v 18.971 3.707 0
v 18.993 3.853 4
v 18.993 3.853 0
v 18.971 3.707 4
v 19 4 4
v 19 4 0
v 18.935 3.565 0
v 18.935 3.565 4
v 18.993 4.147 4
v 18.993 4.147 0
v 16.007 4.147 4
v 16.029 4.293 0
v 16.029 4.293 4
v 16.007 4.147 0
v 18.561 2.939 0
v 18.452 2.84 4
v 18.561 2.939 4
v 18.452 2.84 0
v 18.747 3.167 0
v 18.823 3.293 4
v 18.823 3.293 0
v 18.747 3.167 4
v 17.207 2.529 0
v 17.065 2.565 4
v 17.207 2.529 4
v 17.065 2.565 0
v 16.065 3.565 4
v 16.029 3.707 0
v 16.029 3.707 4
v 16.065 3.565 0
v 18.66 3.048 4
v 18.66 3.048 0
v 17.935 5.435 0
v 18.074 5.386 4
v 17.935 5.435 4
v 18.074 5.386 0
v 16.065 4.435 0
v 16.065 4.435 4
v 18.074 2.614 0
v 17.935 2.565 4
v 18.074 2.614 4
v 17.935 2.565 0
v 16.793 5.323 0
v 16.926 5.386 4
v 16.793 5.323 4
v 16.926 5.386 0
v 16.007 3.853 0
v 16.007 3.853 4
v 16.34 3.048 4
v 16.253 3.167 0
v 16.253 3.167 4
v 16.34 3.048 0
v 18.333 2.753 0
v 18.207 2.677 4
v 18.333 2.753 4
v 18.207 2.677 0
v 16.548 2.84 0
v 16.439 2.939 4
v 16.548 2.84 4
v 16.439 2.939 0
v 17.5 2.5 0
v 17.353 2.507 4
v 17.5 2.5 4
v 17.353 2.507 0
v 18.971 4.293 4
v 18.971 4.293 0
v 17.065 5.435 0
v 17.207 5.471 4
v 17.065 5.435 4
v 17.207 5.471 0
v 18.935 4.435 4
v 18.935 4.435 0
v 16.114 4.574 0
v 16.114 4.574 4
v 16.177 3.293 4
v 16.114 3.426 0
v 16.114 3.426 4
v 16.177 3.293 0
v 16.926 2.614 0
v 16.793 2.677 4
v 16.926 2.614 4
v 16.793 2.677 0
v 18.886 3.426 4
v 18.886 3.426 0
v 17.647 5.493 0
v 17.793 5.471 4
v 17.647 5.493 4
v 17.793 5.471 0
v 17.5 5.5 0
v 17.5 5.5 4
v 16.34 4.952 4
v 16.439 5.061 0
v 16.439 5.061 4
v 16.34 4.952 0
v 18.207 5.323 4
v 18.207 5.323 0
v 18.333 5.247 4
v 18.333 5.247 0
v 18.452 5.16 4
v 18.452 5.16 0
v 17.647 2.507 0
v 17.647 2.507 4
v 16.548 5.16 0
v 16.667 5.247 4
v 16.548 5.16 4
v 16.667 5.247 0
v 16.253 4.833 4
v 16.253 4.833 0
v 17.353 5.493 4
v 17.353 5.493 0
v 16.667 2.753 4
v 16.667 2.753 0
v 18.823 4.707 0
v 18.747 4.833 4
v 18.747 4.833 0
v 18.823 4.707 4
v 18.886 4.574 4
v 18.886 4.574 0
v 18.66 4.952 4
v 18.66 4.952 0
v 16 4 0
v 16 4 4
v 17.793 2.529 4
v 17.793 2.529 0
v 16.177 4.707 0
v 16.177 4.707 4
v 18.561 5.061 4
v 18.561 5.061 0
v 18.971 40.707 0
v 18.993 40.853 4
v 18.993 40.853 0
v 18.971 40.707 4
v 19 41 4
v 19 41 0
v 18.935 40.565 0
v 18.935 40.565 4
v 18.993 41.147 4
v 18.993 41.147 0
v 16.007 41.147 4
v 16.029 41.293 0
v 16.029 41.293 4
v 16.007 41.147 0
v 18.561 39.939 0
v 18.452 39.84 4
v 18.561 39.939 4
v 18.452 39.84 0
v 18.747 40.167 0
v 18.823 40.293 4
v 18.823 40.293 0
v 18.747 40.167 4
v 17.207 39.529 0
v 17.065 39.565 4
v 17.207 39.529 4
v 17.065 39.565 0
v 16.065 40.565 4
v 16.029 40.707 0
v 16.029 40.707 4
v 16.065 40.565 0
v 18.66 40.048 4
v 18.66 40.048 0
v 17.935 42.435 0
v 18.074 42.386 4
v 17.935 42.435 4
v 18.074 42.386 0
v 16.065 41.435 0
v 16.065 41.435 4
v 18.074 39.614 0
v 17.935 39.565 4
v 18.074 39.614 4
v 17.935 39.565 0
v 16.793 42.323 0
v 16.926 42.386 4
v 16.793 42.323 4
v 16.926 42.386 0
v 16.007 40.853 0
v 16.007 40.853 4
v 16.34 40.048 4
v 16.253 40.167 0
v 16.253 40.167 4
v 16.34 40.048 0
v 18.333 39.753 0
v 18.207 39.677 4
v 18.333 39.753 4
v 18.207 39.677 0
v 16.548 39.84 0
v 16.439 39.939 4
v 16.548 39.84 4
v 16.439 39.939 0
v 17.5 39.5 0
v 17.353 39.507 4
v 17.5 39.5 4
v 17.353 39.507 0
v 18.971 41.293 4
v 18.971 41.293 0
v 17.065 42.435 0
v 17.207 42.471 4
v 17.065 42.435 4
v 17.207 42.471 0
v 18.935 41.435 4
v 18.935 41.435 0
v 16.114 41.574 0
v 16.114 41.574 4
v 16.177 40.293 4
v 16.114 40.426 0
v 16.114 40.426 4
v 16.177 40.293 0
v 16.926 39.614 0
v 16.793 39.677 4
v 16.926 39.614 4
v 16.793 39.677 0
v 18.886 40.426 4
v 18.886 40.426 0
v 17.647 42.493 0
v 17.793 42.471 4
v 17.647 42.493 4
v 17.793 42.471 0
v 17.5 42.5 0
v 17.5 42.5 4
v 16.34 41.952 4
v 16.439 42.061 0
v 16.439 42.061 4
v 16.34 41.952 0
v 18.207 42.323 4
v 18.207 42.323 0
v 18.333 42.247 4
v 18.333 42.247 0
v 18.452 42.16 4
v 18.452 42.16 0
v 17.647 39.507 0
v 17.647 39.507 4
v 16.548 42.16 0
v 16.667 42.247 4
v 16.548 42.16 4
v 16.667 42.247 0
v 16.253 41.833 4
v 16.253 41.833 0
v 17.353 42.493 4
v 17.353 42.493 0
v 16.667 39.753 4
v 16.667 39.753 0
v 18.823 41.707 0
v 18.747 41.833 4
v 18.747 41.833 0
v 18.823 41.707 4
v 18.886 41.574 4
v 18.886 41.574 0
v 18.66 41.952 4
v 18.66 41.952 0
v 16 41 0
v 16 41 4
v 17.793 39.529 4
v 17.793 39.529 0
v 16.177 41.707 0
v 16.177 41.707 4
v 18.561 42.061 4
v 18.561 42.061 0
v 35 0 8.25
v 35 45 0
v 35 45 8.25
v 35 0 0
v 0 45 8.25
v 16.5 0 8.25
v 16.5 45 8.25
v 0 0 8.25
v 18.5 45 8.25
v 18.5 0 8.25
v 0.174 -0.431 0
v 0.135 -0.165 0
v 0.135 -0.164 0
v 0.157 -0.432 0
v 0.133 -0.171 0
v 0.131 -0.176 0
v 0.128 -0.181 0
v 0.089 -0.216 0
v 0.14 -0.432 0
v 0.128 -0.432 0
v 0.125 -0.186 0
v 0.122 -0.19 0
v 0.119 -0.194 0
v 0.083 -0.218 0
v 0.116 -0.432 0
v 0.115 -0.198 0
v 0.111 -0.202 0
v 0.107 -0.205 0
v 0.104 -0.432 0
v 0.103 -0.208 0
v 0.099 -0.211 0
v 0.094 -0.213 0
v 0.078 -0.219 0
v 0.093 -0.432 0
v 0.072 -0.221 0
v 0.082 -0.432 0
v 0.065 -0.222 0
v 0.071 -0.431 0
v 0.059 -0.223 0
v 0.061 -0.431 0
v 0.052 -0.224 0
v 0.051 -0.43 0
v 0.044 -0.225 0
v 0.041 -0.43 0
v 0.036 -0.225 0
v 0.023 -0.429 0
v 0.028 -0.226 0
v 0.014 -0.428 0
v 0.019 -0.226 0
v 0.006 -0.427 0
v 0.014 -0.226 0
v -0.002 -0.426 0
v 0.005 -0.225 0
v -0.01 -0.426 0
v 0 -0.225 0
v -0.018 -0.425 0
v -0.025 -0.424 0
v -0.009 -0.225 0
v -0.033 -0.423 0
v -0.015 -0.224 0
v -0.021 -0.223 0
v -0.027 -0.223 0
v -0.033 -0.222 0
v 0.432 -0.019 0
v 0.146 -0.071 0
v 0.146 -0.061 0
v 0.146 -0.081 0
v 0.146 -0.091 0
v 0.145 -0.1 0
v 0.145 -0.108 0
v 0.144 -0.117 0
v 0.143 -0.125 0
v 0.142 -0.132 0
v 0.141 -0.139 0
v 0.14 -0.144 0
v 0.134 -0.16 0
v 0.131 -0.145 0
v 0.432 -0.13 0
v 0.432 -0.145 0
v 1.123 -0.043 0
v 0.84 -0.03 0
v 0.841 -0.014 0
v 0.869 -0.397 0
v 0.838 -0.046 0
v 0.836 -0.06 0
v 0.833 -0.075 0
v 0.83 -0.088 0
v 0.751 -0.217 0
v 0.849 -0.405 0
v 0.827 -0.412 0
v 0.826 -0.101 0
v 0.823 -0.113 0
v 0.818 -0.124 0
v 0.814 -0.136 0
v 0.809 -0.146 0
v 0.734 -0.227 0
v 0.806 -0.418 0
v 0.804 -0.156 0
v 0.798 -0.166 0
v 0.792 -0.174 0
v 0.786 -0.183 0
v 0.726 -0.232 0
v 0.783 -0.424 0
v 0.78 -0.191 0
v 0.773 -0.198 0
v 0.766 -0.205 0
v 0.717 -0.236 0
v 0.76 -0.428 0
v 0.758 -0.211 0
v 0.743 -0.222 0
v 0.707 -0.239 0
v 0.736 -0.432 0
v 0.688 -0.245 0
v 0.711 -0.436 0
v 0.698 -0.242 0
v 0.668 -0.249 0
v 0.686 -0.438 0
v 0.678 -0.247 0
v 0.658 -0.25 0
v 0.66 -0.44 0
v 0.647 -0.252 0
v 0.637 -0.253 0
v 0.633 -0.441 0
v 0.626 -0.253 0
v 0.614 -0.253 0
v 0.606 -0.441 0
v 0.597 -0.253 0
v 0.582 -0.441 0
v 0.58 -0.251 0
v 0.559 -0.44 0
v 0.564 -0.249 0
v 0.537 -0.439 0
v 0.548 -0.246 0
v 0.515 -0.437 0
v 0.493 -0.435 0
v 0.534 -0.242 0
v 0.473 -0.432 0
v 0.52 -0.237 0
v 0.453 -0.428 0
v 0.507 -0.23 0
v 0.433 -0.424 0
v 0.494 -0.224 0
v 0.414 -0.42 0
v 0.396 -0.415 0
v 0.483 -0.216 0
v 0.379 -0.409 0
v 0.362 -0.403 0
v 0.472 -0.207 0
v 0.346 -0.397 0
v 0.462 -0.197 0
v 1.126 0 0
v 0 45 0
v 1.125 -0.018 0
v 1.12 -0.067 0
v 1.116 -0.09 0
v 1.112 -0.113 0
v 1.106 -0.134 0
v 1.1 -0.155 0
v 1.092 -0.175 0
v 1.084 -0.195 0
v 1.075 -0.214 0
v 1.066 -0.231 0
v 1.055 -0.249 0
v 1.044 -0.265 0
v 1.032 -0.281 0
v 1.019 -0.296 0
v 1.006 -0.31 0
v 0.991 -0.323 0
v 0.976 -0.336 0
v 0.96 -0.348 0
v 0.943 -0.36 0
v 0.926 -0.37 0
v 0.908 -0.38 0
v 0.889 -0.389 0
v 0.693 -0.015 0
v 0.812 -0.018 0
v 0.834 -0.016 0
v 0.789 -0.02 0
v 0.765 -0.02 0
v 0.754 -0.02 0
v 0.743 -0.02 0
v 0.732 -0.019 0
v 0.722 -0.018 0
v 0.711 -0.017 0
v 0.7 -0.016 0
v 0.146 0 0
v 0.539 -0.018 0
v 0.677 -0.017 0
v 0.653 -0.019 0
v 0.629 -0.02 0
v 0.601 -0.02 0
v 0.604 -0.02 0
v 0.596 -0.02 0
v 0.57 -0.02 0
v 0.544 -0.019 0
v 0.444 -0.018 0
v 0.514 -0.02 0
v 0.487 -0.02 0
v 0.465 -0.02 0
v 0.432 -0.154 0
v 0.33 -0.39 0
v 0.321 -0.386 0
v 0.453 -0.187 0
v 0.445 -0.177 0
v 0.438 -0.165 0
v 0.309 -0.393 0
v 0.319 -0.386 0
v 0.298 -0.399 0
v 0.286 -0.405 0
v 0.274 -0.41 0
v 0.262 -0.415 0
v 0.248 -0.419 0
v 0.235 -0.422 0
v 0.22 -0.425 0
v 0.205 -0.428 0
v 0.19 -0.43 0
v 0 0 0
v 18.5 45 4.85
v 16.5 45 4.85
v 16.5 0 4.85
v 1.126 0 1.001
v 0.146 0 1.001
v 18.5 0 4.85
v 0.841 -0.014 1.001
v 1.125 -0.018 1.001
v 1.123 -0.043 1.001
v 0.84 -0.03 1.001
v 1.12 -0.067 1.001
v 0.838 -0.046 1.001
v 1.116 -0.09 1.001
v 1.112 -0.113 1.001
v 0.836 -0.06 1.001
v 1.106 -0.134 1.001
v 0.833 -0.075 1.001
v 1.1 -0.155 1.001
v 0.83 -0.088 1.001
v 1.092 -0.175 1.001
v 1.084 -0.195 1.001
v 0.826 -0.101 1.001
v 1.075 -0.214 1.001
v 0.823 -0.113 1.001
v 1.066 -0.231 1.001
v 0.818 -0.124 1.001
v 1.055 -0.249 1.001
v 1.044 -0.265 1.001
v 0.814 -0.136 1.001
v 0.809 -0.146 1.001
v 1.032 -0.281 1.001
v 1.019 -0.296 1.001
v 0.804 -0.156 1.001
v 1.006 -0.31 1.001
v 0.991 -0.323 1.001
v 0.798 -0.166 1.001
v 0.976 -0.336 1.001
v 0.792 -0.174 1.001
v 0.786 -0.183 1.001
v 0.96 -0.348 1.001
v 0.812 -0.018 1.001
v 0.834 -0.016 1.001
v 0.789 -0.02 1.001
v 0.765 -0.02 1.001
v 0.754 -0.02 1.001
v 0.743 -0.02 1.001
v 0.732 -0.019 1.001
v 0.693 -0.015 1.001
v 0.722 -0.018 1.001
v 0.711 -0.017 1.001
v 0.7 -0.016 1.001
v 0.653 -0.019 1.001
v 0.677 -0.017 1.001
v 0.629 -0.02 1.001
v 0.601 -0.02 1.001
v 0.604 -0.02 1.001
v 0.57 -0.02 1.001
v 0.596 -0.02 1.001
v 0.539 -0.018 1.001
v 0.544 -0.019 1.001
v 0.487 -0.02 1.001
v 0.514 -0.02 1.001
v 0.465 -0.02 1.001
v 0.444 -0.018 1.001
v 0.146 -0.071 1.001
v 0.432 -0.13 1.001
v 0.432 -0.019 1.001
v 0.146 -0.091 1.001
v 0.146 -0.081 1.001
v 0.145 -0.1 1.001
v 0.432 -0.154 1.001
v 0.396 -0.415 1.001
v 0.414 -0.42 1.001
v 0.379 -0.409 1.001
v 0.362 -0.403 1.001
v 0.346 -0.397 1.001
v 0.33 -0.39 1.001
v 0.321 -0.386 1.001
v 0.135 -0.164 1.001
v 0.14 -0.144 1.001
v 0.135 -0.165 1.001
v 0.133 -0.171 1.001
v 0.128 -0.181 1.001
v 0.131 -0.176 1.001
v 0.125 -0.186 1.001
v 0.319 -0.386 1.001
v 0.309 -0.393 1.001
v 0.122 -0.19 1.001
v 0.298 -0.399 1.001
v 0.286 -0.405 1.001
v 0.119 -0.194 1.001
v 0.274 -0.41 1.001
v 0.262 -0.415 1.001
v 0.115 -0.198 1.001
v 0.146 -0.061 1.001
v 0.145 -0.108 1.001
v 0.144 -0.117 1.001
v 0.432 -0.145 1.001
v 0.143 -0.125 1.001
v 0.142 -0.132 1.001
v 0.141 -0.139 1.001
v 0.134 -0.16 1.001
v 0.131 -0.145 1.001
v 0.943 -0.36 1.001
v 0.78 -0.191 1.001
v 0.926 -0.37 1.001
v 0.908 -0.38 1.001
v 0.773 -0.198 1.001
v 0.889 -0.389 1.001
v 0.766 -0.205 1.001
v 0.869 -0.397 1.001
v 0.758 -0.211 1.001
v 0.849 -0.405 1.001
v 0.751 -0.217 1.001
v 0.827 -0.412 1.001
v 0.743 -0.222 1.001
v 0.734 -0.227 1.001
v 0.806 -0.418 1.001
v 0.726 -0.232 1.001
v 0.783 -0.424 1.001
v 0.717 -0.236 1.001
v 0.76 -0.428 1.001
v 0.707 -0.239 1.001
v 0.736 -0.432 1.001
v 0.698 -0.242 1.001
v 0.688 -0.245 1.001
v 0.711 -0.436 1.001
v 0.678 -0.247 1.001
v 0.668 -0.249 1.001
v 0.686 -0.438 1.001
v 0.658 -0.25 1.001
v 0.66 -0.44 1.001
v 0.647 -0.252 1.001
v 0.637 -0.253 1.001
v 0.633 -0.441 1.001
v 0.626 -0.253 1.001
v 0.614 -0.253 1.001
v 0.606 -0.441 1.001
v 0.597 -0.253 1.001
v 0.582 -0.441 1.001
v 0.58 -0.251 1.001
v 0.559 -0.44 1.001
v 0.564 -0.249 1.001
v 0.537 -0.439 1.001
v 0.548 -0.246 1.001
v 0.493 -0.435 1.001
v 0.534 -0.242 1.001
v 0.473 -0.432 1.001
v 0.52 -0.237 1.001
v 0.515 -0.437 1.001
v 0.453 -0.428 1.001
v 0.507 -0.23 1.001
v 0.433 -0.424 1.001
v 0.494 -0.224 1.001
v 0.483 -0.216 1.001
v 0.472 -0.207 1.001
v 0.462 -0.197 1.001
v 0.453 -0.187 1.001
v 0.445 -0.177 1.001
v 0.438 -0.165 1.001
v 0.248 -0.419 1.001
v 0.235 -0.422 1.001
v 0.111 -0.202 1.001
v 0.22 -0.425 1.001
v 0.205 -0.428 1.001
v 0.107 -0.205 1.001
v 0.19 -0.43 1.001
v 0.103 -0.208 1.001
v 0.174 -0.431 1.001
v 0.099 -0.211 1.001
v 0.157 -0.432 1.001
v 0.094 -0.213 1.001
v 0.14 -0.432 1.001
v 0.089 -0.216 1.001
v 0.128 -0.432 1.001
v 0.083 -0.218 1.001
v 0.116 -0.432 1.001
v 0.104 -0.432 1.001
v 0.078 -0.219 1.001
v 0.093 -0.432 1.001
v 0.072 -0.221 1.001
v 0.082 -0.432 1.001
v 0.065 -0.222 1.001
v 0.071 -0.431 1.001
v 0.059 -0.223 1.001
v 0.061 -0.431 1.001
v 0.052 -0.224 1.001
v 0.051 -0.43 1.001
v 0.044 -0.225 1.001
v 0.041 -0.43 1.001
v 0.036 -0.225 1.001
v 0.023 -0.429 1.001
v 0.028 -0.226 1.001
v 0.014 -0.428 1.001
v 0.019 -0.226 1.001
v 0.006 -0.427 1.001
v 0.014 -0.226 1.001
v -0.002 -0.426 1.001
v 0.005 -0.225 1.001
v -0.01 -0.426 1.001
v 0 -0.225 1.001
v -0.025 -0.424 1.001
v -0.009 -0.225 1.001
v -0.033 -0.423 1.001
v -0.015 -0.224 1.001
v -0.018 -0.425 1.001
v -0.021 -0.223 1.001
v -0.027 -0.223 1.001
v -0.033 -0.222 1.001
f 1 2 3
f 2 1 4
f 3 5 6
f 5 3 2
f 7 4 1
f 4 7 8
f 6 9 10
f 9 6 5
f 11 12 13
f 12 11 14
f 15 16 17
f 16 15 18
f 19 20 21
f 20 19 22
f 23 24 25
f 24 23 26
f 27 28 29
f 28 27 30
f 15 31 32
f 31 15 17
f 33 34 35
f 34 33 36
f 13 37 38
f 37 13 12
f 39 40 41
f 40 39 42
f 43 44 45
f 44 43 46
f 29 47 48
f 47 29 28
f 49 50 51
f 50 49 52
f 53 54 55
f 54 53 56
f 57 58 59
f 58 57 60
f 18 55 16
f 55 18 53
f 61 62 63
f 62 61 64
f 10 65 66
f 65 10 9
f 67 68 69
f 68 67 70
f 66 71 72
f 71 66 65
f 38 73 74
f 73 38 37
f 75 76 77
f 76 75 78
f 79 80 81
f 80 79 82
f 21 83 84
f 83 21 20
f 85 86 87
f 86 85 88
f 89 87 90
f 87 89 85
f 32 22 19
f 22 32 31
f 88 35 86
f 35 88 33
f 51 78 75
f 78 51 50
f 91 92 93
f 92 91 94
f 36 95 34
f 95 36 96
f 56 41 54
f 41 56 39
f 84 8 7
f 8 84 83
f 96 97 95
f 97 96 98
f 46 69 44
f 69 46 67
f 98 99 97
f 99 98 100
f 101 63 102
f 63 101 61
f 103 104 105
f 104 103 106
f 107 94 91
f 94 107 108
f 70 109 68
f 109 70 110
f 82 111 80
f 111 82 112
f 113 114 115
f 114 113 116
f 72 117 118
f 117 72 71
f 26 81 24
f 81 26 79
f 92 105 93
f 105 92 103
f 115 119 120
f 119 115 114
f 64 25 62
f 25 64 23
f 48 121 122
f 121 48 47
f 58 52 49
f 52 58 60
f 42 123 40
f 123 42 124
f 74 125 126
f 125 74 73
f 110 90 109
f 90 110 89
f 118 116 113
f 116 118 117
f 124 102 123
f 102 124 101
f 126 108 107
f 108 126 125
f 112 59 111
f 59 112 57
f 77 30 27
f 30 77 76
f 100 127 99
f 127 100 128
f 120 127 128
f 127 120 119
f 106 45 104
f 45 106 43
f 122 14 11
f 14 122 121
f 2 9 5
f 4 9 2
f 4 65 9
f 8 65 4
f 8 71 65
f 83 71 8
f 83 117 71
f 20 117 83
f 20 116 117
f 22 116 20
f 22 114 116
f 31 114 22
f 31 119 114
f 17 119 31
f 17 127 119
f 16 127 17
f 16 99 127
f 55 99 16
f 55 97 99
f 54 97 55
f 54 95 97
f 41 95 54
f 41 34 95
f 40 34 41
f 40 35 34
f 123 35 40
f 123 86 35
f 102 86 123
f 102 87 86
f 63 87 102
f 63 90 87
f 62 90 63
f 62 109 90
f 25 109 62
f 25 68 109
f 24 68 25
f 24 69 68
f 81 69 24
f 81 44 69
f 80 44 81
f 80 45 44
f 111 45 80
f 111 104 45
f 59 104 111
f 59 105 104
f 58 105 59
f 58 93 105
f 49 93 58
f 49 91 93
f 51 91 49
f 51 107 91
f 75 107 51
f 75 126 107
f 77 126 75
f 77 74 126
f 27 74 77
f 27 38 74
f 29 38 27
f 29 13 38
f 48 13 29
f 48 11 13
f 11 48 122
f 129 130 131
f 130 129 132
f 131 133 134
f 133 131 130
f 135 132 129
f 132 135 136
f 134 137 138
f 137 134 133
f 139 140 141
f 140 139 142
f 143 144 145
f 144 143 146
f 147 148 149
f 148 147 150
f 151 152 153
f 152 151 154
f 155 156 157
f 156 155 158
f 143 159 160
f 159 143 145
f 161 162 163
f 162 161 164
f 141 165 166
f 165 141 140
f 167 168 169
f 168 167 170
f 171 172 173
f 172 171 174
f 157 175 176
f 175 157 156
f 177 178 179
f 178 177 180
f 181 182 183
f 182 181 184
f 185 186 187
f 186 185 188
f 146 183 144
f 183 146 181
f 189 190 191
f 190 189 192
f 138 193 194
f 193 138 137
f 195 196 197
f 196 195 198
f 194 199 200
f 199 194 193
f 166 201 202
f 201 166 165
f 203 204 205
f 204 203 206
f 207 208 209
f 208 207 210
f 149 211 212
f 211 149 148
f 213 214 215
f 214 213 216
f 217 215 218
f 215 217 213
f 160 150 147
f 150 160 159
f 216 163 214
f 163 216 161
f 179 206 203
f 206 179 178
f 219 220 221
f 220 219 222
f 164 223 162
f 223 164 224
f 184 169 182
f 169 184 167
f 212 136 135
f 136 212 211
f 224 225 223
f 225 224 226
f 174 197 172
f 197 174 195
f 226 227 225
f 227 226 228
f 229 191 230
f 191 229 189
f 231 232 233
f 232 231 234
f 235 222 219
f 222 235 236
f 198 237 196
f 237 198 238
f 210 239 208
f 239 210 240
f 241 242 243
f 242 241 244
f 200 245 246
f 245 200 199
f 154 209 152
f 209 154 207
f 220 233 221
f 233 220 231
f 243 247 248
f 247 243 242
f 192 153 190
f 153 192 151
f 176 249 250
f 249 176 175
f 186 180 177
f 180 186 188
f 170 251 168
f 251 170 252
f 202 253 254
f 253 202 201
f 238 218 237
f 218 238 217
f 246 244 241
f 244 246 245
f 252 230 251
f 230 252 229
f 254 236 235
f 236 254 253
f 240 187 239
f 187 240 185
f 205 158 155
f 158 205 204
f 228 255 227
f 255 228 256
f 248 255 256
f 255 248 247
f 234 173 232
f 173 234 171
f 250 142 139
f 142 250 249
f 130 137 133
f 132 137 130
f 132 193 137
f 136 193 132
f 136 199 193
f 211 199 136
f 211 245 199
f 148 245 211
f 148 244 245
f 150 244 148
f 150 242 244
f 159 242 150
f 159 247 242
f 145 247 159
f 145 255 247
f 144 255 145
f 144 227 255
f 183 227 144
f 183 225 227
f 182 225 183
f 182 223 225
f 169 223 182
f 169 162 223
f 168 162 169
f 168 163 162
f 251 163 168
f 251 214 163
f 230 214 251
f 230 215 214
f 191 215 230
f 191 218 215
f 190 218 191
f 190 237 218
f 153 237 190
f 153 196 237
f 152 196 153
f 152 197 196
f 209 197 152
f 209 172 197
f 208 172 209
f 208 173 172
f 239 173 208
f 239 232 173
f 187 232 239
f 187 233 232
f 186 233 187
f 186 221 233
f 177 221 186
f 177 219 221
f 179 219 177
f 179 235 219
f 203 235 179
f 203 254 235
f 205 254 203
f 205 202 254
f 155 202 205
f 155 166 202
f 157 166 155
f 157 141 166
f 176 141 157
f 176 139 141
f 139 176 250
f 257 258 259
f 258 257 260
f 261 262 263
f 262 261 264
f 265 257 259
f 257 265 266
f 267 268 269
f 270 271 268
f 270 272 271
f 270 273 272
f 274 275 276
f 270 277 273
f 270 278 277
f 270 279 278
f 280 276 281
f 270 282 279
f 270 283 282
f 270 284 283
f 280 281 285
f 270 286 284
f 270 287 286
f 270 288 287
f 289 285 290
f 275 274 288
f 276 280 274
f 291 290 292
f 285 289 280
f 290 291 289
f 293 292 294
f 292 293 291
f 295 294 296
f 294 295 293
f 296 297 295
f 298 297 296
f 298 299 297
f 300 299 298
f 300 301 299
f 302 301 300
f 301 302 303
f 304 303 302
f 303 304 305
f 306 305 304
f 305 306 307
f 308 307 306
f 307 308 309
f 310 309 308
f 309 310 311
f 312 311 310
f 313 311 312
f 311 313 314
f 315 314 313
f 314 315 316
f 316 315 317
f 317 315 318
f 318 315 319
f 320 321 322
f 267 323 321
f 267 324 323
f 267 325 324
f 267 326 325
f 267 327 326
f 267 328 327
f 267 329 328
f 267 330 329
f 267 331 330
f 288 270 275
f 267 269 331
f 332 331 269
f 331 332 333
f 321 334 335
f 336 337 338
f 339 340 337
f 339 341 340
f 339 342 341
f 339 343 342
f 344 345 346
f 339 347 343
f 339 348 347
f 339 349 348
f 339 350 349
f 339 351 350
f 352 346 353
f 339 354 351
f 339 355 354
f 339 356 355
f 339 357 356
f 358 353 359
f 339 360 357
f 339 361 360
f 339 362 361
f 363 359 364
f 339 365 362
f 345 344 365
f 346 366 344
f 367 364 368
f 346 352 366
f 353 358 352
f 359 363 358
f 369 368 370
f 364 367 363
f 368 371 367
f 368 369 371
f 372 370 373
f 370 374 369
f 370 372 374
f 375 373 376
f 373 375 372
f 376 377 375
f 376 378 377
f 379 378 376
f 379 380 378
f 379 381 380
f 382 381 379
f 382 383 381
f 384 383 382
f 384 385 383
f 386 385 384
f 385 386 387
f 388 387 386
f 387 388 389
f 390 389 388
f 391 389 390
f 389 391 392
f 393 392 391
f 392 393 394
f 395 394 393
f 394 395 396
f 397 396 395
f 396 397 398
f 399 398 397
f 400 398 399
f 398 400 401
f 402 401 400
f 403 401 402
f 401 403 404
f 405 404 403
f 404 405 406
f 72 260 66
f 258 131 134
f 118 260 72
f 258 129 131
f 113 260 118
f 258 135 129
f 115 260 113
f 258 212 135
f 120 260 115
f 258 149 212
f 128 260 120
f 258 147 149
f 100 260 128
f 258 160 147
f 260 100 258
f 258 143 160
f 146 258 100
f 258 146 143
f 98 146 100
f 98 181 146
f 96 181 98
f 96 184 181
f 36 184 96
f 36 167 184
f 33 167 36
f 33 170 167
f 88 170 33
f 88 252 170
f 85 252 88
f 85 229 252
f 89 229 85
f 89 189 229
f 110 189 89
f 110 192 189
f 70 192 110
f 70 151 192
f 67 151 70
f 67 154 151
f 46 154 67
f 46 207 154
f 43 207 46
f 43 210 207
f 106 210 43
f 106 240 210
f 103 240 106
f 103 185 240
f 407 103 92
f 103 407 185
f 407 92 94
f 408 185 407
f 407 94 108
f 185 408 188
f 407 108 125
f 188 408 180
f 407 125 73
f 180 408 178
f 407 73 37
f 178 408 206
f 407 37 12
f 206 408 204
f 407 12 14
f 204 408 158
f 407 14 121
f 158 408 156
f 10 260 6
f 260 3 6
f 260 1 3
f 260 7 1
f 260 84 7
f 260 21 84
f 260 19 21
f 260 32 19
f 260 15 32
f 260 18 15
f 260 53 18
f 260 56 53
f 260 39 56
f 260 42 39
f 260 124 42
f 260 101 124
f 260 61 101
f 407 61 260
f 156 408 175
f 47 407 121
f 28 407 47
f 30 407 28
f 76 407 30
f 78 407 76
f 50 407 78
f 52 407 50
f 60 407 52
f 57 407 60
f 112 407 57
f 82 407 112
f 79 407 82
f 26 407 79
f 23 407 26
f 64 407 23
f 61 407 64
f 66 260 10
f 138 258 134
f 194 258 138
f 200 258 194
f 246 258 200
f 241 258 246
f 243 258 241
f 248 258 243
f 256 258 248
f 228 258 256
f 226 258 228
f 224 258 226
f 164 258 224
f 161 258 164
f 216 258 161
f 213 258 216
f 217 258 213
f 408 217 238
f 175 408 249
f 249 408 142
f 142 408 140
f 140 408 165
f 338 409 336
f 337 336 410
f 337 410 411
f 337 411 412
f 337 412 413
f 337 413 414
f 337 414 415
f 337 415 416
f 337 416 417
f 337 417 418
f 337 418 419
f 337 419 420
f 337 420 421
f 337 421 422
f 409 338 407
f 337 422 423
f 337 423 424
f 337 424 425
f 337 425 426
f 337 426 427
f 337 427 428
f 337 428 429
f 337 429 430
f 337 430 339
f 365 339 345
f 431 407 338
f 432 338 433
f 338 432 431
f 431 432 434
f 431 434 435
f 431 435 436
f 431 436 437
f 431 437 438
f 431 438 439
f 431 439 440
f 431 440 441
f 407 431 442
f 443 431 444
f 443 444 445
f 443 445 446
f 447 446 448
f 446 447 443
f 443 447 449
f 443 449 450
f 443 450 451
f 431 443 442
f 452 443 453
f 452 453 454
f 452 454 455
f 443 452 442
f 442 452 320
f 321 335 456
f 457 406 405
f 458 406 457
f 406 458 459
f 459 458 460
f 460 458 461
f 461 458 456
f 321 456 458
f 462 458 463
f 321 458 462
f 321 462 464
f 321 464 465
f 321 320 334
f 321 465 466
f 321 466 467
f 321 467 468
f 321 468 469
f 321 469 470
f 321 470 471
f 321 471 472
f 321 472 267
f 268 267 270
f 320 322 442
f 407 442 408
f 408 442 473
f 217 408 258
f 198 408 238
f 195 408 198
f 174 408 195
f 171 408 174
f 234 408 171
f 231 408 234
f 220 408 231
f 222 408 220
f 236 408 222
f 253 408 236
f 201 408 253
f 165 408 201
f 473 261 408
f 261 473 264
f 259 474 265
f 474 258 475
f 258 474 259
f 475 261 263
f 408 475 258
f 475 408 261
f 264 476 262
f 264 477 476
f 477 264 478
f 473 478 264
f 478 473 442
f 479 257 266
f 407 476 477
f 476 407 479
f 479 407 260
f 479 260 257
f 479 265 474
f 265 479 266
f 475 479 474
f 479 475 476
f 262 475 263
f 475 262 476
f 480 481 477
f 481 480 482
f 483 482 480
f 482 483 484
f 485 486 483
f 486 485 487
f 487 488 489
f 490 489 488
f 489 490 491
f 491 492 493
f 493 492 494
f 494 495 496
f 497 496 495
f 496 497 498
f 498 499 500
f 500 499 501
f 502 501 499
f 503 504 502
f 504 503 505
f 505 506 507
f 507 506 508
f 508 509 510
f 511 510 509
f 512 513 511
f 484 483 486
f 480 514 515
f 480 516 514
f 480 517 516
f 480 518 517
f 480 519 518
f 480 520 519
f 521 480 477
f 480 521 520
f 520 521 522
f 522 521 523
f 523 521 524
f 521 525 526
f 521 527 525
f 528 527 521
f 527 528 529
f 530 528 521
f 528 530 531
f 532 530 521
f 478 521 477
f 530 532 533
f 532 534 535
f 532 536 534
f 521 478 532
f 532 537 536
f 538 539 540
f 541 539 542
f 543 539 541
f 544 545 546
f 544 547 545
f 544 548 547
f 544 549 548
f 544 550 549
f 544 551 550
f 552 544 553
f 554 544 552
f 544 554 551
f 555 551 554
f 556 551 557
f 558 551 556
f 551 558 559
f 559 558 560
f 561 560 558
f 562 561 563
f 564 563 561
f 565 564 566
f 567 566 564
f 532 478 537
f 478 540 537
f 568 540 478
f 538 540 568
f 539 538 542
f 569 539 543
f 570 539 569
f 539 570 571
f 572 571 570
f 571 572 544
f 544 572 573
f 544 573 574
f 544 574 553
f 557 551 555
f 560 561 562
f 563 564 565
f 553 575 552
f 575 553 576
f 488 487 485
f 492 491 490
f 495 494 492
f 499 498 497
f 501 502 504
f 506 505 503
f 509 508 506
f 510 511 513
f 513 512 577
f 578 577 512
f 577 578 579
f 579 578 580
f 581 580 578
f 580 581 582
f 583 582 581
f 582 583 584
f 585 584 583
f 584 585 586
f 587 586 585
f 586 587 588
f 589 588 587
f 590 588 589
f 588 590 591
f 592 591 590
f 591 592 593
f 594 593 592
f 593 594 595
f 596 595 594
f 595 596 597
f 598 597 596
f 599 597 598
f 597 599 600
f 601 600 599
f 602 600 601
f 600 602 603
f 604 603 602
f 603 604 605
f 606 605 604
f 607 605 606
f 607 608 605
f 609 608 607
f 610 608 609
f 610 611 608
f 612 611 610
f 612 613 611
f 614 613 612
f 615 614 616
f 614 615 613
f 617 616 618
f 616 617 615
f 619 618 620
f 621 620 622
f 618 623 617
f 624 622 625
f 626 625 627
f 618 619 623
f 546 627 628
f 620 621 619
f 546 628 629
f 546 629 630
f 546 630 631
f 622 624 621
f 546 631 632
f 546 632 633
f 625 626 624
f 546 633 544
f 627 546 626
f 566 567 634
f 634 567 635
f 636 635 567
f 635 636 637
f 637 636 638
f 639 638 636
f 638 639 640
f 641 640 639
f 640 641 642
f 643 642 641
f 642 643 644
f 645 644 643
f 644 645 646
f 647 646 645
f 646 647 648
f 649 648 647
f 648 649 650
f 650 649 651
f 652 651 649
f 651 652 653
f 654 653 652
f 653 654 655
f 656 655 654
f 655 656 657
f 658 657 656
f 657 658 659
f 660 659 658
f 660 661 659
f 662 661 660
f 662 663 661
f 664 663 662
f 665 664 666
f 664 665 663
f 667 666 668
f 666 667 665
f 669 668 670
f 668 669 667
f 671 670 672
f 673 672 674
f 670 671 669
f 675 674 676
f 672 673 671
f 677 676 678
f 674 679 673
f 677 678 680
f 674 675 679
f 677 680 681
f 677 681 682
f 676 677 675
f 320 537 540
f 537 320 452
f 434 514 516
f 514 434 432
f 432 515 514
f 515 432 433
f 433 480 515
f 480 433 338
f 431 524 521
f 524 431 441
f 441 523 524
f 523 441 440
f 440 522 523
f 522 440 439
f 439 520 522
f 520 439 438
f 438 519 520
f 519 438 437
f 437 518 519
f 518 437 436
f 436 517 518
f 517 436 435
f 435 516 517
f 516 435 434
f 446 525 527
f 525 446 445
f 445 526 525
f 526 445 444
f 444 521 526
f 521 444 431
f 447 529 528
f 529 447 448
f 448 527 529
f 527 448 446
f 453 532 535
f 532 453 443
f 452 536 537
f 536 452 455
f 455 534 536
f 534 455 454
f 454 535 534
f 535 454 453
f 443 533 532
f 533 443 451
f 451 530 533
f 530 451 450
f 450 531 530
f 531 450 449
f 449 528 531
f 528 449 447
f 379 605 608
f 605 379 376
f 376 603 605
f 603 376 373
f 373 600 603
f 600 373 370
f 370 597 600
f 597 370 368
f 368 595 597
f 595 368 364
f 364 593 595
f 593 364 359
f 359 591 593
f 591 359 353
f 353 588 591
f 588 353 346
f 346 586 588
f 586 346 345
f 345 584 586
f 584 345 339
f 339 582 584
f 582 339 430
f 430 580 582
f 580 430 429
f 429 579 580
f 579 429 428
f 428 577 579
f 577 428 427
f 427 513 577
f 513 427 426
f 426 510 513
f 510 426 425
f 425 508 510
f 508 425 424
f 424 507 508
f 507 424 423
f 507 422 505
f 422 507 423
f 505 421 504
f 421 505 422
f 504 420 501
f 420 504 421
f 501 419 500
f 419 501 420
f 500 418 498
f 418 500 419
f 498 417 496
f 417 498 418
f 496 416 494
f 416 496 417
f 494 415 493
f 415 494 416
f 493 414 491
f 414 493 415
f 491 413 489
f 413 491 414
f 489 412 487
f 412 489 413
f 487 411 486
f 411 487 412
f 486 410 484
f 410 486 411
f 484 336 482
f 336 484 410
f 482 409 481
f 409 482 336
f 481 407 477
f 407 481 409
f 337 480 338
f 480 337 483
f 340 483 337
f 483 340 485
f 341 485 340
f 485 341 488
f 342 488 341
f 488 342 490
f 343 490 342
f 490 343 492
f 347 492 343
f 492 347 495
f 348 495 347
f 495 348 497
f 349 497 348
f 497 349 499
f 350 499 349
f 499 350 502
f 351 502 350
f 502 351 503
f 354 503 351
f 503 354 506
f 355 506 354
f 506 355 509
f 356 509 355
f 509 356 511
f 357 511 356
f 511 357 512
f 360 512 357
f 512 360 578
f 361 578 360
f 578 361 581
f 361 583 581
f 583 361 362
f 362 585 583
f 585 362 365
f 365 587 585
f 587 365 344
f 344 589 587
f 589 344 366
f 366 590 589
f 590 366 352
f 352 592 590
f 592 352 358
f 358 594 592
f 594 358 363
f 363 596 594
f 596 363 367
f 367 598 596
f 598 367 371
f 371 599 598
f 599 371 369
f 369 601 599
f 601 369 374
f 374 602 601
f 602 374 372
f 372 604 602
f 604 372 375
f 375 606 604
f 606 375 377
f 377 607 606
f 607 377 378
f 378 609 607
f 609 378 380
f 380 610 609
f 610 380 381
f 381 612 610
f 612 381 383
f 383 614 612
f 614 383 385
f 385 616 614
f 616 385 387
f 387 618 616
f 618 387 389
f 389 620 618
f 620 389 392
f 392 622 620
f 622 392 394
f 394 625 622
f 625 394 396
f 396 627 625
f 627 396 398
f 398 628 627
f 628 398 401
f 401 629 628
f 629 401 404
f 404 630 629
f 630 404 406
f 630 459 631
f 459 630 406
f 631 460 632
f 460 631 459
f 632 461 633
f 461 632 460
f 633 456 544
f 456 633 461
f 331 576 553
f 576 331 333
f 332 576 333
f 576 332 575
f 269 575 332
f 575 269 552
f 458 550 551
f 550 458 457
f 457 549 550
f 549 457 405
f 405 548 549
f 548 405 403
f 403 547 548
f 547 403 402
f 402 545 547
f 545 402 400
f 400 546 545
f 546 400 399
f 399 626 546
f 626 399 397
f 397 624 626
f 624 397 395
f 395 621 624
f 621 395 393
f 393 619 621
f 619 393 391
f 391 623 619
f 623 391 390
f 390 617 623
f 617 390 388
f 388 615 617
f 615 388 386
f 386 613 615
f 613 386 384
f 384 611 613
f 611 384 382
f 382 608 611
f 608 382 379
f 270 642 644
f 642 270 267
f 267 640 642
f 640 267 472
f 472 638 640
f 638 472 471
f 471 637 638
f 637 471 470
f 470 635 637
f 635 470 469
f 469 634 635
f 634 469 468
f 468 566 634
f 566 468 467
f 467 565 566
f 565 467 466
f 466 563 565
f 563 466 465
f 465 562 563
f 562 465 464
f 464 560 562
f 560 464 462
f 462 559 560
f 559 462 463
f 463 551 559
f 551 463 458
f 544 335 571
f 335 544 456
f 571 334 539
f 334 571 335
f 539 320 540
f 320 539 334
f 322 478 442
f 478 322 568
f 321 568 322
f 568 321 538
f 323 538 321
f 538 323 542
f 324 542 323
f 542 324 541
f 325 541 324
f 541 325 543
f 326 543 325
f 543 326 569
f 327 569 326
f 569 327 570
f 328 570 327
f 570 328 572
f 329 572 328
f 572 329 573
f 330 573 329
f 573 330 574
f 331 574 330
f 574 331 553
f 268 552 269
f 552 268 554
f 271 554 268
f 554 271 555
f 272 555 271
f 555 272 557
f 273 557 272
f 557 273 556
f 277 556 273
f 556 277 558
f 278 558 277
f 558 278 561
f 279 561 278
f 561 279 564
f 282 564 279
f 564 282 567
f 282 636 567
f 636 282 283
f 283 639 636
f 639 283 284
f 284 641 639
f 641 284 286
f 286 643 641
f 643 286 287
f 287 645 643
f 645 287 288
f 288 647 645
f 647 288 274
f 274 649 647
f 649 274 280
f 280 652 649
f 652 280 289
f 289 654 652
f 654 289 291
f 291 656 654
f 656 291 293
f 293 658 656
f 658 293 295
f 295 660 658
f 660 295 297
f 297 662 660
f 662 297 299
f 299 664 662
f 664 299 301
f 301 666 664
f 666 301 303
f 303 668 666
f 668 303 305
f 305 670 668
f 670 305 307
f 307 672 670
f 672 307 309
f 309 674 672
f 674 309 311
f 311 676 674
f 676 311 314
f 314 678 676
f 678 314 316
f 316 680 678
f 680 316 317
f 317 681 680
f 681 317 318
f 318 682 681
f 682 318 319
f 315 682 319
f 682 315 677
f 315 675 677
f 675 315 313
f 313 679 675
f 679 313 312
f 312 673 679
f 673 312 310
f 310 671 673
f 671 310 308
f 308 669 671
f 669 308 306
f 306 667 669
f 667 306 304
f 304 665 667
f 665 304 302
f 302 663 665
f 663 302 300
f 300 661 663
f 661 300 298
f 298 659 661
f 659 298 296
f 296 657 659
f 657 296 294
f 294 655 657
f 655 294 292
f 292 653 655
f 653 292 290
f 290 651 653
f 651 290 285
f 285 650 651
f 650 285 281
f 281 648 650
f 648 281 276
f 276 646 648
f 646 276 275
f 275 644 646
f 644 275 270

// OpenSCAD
use <../MicrocontrollerBreadboards.scad>;

$fn = $preview ? 32 : 64;

/*
// ESP8266 (Mini) V1
[(63+1)*2.54, 54.2, 8.25, 2.54, 10, 1, 5, global_text_size, global_text_thickness, global_text_font, global_alphabet, global_starting_letter, 3, [[22.86-1, 0, 63, 2]]],
// ESP8266 (Mini) V2
[(63+1)*2.54, 54.2, 8.25, 2.54, 10, 1, 5, global_text_size, global_text_thickness, global_text_font, global_alphabet, global_starting_letter, 3, [[22.86-1, 0, 24, 2], [22.86-1, 24, 63-24, 1]]],
// ESP8266 (Mini) V3
[(63+1)*2.54, 54.2, 8.25, 2.54, 10, 1, 5, global_text_size, global_text_thickness, global_text_font, global_alphabet, global_starting_letter, 3, [[22.86-1, 0, 24, 2], [7.62, 24, 63-24, 0]]],
*/

test_spec=[
        45,            // board_depth
        35,                     // board_width
        8.25,                   // board_height
        2.54,                   // pin_pitch
        0,                      // power_rail_sections
        0.9,                    // Pin Width
        5,                      // Number of pins in a row
        1.5,                    // Text Size
        1,                      // Text Thickness
        "Nimbus Sans L:Bold",   // Text Font
        "abcdefghijklmnopqrstuvwxyzABCDEFGHIJKLMNOPQRSTUVWXYZ", // Alphabet to use for column numbering/lettering 
        1,                      // Starting letter in Aphabet
        3,                      // 0 = off, 1 = back screw, 2 = 2mm Nut, 3 = 2mm Heat Insert, 4 = Wood Screw
        [
            [7.62, 0, 5, 0,
            false],
            [7.62, 5, 5, 0,
            true],
            [7.62, 10, 7, 0,
            false],
        ]
    ];
single_board(0, 0, test_spec);
